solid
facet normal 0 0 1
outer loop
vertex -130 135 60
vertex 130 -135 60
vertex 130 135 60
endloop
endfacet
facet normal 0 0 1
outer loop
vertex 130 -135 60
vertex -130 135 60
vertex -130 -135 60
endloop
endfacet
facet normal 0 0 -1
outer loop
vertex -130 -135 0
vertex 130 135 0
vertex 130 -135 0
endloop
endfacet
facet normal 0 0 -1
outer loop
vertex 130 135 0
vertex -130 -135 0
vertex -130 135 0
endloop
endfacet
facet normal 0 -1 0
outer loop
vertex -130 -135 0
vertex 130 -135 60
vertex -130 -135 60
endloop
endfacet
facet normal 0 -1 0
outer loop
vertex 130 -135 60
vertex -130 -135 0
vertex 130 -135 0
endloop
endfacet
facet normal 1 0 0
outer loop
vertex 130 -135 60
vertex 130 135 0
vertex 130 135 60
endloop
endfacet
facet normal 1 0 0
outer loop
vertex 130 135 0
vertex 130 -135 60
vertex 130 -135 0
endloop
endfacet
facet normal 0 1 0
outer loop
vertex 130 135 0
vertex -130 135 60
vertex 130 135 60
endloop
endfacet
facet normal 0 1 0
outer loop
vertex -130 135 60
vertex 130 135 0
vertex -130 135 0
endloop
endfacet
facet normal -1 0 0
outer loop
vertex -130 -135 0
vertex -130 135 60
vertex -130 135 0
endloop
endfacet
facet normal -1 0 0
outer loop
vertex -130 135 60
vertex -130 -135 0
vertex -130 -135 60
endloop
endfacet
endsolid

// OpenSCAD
// Generated documentary F1 envelope proxy.
// Not manufacturing geometry, not dimensionally validated, not SimReady.
proxy_id = "993-INTERCOOLER-REPLACEMENT-AKS";
$fn = 96;

length_mm = 260;
width_mm = 270;
height_mm = 60;

translate([-length_mm / 2, -width_mm / 2, 0])
    cube([length_mm, width_mm, height_mm], center = false);
